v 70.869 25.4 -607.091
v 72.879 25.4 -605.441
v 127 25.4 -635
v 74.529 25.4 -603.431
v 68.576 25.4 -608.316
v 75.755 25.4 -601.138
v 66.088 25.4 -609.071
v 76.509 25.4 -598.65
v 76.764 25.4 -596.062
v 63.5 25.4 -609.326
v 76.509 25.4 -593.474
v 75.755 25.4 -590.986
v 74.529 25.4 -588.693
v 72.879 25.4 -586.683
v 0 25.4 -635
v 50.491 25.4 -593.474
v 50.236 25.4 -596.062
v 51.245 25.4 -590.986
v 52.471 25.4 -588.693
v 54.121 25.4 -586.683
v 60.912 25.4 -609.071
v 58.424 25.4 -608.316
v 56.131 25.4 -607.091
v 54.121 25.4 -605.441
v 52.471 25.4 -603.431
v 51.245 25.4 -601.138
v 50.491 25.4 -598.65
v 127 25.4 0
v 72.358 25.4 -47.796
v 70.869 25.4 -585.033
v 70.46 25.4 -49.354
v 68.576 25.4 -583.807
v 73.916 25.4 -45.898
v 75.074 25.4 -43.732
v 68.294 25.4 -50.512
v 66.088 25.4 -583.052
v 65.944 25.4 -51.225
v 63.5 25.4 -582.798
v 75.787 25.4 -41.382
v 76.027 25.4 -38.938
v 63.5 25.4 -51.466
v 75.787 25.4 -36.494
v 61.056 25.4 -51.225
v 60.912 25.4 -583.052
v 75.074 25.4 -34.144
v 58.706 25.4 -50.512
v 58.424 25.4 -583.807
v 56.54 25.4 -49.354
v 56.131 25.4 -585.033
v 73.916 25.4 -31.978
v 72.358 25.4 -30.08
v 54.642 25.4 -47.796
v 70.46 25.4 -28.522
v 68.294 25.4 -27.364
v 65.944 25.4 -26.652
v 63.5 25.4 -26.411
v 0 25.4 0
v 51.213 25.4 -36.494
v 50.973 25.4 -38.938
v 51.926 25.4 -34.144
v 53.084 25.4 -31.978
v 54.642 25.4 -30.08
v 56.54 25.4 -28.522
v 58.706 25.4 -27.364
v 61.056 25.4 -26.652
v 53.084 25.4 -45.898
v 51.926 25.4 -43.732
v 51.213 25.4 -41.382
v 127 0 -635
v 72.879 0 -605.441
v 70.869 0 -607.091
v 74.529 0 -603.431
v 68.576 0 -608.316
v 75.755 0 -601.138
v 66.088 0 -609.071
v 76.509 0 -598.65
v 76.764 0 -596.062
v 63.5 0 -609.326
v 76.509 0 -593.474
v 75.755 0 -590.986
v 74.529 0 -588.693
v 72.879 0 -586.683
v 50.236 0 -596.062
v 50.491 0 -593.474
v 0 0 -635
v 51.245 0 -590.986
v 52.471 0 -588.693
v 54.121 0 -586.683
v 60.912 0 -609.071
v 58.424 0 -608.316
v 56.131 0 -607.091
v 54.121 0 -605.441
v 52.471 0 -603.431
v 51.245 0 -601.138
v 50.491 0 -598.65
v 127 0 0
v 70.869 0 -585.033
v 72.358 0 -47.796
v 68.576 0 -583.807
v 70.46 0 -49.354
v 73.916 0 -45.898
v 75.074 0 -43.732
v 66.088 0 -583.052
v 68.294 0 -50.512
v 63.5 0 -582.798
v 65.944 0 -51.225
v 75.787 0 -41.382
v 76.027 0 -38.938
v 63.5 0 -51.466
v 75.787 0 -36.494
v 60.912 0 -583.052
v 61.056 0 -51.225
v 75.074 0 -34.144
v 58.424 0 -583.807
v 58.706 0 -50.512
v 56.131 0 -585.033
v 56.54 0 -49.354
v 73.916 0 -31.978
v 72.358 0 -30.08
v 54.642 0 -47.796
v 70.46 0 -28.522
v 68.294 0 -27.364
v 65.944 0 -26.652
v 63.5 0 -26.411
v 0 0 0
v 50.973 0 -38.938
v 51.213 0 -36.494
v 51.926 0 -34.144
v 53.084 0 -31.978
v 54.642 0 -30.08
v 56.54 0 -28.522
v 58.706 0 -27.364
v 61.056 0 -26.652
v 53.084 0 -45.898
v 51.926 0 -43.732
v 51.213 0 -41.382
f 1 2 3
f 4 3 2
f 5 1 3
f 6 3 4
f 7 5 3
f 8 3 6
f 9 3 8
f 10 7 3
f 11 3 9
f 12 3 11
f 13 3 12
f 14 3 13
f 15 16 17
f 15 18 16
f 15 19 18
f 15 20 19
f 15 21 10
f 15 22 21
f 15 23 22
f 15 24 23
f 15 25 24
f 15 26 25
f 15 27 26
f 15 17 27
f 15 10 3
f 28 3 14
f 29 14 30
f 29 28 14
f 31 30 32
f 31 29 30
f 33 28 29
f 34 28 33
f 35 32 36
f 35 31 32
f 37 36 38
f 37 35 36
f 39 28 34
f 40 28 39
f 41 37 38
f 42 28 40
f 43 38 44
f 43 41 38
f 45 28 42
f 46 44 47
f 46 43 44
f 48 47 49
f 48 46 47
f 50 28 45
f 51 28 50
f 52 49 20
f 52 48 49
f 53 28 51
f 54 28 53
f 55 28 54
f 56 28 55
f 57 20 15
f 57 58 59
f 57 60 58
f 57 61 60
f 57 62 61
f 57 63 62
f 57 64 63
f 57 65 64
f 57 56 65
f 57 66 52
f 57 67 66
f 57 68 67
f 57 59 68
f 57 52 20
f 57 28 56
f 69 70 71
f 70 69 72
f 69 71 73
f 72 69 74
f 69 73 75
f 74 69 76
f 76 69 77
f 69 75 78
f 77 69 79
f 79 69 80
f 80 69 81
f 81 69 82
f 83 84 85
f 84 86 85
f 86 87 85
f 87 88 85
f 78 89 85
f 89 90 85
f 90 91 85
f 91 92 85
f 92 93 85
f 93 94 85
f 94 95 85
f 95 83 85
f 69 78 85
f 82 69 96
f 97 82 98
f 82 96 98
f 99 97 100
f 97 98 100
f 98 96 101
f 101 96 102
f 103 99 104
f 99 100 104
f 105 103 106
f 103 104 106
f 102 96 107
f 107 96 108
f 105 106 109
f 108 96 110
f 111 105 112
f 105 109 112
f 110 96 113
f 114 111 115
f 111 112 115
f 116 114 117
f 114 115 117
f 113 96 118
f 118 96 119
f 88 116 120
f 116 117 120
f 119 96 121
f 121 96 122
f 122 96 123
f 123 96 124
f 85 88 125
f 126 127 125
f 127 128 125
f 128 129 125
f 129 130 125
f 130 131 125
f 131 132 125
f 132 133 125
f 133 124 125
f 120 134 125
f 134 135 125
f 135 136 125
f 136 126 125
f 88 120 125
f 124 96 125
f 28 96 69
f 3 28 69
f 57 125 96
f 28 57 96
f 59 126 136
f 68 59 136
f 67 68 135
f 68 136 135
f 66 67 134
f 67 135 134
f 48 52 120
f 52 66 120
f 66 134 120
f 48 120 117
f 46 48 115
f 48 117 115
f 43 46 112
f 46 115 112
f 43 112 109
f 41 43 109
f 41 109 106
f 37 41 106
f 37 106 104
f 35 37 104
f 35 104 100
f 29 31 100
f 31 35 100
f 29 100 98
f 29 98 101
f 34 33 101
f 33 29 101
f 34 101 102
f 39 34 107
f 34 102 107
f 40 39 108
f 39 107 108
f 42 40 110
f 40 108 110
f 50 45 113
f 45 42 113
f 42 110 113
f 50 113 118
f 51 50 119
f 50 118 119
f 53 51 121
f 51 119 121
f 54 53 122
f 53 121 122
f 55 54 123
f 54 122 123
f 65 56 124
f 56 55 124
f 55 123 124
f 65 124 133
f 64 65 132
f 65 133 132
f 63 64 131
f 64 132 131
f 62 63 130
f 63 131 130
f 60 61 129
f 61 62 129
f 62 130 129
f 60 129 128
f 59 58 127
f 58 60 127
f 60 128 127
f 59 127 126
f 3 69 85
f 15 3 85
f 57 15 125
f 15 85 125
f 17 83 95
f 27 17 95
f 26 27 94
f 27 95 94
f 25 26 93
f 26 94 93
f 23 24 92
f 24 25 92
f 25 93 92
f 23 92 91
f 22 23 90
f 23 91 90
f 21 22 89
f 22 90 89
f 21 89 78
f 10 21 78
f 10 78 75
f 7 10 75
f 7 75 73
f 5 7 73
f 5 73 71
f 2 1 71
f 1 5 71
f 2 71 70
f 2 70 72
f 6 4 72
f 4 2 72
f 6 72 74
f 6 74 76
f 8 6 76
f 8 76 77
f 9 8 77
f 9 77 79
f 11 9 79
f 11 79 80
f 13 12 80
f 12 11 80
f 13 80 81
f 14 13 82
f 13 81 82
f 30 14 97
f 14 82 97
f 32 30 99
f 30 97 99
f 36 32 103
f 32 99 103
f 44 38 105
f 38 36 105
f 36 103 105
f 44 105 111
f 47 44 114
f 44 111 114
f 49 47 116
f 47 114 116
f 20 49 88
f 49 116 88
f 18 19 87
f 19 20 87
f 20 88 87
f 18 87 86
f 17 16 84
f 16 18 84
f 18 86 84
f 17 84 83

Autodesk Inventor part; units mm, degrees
ref_plane "YZ Plane" through (0, 0, 0) normal (1, 0, 0) x (0, 1, 0)
ref_plane "XZ Plane" through (0, 0, 0) normal (0, 1, 0) x (-1, 0, 0)
ref_plane "XY Plane" through (0, 0, 0) normal (0, 0, 1) x (1, 0, 0)
sketch "Sketch1" plane through (0, 0, 0) normal (0, 1, 0) x (-1, 0, 0)
  line L0 (0, 0) -> (-127, 0)
  line L1 (-127, 0) -> (-127, -635)
  line L2 (-127, -635) -> (0, -635)
  line L3 (0, -635) -> (0, 0)
  circle A0 centre (-63.5, -38.9382) radius 12.5273
  circle A1 centre (-63.5, -596.0618) radius 13.2642
  dimension "d0" = 127
  dimension "d1" = 635
  dimension "d2" = 38.9382
  dimension "d3" = 38.9382
extrude "Extrusion1" add sketch "Sketch1" along normal blind 25.4
properties part number "Frame"
